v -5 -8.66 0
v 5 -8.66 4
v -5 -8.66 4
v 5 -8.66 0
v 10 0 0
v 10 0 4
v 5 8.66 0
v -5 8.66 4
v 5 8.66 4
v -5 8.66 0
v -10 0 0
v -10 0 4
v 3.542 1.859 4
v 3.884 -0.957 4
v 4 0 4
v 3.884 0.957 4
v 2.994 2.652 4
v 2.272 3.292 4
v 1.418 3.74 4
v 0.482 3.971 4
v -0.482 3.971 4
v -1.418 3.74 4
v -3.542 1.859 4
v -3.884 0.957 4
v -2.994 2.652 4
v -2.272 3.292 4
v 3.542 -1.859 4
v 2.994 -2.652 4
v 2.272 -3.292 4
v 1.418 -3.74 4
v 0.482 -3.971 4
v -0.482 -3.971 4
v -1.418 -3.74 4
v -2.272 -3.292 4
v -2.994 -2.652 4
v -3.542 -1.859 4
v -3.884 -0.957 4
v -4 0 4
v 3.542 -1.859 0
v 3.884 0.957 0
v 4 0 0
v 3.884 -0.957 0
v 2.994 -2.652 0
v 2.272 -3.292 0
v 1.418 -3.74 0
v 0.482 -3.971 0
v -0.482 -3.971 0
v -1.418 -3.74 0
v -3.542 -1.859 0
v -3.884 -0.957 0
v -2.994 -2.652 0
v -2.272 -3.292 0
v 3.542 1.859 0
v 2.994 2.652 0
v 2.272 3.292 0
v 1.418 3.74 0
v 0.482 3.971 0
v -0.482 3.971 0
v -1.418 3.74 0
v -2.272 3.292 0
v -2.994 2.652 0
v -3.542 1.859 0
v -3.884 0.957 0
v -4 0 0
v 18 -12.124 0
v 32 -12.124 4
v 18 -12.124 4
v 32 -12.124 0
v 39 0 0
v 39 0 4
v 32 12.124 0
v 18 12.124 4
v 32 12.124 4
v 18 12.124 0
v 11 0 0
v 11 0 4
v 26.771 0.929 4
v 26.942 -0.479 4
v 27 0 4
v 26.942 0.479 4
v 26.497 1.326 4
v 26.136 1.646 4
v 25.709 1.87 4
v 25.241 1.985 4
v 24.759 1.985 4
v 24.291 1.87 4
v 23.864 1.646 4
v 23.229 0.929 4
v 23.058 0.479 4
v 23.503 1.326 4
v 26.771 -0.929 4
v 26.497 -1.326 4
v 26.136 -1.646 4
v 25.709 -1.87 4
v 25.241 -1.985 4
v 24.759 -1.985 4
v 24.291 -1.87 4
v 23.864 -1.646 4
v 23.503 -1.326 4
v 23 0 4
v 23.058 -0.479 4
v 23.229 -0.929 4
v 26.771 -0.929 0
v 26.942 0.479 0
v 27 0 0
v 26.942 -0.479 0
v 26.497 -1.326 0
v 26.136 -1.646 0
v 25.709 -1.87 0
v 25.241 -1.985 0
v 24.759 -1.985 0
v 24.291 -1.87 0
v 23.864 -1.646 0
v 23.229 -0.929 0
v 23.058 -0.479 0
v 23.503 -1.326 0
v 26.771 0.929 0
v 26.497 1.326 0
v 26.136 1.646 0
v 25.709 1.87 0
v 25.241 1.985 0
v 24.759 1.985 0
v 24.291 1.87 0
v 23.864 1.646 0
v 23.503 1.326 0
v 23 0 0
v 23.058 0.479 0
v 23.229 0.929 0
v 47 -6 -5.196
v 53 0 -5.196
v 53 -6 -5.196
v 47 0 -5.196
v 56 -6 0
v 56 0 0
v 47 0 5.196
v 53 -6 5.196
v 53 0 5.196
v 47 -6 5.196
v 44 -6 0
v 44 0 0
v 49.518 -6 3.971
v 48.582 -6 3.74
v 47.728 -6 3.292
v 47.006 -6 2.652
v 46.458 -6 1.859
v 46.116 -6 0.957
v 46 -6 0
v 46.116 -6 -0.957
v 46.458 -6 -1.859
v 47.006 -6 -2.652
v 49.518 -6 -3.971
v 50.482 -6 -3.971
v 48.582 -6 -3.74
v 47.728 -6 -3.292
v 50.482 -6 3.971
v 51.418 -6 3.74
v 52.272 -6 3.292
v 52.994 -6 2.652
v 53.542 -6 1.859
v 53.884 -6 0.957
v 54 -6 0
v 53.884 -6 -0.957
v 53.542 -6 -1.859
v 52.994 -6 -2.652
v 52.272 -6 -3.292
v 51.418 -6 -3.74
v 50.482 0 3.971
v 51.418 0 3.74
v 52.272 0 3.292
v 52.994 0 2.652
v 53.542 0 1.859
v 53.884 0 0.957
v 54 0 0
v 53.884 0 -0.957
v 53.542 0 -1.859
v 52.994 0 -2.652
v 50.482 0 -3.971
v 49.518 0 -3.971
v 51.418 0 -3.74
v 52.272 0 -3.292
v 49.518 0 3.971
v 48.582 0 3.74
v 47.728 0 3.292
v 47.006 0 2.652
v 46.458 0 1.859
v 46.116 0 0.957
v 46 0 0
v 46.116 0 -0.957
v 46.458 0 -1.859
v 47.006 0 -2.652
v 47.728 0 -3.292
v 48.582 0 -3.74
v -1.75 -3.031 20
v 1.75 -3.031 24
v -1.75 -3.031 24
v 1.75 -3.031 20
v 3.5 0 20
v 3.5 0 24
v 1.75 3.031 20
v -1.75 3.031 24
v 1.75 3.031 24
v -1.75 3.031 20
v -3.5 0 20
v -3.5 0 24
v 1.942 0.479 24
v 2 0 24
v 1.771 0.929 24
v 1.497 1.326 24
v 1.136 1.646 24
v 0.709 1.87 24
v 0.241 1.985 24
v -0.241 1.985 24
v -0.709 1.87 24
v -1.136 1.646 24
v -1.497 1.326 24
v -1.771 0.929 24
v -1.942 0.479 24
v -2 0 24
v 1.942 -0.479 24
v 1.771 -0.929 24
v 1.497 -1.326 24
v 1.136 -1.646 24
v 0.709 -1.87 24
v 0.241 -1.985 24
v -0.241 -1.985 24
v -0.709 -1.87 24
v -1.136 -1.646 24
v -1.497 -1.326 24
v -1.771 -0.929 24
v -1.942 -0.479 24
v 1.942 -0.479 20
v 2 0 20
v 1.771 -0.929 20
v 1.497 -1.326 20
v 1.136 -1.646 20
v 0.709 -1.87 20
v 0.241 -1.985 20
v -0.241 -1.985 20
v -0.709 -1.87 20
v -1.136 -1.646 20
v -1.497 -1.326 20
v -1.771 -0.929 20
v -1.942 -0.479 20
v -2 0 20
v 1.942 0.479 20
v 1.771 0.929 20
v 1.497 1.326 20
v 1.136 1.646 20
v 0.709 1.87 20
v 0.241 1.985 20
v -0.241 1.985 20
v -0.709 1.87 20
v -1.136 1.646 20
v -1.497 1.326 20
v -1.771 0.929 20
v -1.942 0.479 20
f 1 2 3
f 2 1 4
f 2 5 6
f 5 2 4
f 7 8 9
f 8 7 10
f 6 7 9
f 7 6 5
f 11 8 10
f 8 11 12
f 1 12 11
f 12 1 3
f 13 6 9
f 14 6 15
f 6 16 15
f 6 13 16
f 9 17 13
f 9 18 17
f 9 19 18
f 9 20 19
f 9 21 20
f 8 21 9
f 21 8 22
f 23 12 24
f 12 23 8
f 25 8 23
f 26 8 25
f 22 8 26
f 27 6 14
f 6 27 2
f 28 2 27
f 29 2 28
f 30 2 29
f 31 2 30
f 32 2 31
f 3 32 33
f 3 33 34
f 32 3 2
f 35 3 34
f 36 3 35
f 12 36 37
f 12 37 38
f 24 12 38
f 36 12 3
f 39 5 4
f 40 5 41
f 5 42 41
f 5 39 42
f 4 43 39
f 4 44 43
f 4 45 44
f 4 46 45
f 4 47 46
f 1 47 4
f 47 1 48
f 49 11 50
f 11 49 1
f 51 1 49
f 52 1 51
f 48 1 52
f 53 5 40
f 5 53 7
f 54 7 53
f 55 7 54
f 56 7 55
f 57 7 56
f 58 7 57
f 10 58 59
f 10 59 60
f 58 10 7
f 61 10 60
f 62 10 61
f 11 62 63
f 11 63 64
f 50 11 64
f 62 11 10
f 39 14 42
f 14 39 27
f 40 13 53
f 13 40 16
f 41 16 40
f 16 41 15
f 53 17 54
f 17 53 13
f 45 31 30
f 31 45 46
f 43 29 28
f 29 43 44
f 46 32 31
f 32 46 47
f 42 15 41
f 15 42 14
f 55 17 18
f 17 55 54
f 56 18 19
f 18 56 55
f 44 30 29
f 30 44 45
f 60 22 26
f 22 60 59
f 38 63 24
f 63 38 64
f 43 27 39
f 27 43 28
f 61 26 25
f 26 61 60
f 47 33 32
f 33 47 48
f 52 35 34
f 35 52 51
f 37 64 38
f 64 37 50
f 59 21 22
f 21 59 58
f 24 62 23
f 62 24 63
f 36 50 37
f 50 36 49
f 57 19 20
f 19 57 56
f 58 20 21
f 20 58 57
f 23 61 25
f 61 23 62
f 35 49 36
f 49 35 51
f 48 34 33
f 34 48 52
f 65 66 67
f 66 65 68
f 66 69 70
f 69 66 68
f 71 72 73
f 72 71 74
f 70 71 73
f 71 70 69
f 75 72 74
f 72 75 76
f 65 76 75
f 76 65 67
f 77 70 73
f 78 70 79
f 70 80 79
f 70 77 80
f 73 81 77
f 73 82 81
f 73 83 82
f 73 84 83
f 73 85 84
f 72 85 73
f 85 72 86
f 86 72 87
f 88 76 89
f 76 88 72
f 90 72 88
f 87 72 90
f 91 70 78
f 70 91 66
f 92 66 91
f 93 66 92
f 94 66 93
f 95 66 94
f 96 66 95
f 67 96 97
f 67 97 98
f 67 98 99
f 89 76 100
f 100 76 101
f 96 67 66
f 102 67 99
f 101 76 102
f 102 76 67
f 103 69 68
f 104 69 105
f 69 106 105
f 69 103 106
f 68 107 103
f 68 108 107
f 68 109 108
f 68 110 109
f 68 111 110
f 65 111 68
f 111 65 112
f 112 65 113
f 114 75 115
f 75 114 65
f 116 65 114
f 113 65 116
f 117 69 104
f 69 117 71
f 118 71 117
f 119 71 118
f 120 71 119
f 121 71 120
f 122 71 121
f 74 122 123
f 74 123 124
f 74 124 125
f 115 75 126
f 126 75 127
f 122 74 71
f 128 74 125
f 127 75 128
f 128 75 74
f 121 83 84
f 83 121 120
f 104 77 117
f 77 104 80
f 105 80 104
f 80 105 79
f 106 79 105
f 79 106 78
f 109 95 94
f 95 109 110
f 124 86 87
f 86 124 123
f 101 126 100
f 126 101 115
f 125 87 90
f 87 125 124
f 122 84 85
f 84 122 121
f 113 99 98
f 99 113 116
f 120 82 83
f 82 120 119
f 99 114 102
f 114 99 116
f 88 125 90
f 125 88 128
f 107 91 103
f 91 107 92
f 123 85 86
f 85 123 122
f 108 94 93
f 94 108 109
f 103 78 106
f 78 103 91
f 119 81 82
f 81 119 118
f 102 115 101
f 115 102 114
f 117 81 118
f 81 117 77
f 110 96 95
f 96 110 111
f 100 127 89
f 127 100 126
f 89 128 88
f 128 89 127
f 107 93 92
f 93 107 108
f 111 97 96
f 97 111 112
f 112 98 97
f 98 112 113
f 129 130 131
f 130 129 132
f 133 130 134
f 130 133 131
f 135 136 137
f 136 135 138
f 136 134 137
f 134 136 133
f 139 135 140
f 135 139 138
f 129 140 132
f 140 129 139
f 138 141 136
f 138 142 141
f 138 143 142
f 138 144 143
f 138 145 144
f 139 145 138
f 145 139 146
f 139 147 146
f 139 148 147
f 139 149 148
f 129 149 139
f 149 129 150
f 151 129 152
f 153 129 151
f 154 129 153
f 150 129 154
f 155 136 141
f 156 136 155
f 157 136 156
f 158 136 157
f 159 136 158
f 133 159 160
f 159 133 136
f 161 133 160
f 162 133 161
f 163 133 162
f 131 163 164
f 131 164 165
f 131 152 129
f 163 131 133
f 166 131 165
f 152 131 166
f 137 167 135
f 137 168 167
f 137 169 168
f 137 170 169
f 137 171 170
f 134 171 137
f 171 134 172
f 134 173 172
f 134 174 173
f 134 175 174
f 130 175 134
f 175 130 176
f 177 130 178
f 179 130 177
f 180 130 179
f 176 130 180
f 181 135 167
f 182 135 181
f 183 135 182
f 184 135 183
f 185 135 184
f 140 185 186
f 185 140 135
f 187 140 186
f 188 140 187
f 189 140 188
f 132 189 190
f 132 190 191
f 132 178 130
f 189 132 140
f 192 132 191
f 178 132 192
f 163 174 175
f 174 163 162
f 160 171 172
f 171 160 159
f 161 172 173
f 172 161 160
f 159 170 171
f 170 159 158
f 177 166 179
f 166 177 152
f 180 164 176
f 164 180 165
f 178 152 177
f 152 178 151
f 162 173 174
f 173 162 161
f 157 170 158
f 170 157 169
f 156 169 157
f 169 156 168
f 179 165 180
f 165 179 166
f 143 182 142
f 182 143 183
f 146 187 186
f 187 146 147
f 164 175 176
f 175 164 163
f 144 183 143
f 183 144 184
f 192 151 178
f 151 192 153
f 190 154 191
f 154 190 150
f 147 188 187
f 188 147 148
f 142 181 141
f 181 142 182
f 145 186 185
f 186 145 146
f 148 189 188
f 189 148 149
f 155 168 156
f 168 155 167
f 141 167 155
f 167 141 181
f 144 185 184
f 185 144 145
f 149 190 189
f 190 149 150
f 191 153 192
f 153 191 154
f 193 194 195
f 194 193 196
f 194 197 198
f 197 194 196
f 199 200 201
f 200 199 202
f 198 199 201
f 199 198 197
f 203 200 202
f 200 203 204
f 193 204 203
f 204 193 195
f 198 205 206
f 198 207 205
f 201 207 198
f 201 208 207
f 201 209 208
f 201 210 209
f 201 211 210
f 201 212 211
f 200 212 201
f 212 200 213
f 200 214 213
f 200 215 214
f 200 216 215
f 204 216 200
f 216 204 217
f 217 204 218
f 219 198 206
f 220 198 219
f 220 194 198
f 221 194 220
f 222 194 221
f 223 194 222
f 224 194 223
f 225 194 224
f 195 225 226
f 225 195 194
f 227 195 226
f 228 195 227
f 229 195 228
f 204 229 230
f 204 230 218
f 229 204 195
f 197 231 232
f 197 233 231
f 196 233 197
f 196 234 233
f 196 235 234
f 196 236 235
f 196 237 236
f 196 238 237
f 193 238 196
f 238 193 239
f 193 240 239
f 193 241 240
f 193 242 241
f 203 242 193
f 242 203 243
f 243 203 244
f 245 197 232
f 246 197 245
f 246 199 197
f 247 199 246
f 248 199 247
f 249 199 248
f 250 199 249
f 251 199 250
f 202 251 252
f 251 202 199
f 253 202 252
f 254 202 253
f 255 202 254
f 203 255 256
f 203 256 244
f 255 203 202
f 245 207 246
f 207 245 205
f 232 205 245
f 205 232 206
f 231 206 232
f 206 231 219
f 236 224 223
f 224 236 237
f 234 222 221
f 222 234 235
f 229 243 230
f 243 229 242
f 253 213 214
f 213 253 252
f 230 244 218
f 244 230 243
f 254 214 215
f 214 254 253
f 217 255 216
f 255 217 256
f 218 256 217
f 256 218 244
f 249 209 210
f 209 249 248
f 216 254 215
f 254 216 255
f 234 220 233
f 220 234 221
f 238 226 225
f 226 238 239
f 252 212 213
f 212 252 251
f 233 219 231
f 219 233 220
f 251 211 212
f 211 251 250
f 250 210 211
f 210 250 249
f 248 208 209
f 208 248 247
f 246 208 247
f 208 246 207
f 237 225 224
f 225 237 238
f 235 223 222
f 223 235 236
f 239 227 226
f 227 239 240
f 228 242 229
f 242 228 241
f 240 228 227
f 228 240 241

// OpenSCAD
module piulita(raza_exterior, raza_interior, grosime)
{
    difference(){
        cylinder(h = grosime, r = raza_exterior, $fn = 6);
    
        translate ([0, 0, -1]) cylinder(h = grosime + 2, r = raza_interior, $fn = 26);
    }
}
//-----------------------
module piulita_M4()
{
 piulita(3.5, 2, 4);
    
}


color ("red") piulita(10, 4, 4);
color ("yellow") translate ([25, 0, 0]) piulita(14, 2, 4);

color("blue") translate ([50, 0, 0]) rotate([90, 0, 0]) piulita(6, 4, 6);
translate([0, 0, 20]) piulita_M4();
